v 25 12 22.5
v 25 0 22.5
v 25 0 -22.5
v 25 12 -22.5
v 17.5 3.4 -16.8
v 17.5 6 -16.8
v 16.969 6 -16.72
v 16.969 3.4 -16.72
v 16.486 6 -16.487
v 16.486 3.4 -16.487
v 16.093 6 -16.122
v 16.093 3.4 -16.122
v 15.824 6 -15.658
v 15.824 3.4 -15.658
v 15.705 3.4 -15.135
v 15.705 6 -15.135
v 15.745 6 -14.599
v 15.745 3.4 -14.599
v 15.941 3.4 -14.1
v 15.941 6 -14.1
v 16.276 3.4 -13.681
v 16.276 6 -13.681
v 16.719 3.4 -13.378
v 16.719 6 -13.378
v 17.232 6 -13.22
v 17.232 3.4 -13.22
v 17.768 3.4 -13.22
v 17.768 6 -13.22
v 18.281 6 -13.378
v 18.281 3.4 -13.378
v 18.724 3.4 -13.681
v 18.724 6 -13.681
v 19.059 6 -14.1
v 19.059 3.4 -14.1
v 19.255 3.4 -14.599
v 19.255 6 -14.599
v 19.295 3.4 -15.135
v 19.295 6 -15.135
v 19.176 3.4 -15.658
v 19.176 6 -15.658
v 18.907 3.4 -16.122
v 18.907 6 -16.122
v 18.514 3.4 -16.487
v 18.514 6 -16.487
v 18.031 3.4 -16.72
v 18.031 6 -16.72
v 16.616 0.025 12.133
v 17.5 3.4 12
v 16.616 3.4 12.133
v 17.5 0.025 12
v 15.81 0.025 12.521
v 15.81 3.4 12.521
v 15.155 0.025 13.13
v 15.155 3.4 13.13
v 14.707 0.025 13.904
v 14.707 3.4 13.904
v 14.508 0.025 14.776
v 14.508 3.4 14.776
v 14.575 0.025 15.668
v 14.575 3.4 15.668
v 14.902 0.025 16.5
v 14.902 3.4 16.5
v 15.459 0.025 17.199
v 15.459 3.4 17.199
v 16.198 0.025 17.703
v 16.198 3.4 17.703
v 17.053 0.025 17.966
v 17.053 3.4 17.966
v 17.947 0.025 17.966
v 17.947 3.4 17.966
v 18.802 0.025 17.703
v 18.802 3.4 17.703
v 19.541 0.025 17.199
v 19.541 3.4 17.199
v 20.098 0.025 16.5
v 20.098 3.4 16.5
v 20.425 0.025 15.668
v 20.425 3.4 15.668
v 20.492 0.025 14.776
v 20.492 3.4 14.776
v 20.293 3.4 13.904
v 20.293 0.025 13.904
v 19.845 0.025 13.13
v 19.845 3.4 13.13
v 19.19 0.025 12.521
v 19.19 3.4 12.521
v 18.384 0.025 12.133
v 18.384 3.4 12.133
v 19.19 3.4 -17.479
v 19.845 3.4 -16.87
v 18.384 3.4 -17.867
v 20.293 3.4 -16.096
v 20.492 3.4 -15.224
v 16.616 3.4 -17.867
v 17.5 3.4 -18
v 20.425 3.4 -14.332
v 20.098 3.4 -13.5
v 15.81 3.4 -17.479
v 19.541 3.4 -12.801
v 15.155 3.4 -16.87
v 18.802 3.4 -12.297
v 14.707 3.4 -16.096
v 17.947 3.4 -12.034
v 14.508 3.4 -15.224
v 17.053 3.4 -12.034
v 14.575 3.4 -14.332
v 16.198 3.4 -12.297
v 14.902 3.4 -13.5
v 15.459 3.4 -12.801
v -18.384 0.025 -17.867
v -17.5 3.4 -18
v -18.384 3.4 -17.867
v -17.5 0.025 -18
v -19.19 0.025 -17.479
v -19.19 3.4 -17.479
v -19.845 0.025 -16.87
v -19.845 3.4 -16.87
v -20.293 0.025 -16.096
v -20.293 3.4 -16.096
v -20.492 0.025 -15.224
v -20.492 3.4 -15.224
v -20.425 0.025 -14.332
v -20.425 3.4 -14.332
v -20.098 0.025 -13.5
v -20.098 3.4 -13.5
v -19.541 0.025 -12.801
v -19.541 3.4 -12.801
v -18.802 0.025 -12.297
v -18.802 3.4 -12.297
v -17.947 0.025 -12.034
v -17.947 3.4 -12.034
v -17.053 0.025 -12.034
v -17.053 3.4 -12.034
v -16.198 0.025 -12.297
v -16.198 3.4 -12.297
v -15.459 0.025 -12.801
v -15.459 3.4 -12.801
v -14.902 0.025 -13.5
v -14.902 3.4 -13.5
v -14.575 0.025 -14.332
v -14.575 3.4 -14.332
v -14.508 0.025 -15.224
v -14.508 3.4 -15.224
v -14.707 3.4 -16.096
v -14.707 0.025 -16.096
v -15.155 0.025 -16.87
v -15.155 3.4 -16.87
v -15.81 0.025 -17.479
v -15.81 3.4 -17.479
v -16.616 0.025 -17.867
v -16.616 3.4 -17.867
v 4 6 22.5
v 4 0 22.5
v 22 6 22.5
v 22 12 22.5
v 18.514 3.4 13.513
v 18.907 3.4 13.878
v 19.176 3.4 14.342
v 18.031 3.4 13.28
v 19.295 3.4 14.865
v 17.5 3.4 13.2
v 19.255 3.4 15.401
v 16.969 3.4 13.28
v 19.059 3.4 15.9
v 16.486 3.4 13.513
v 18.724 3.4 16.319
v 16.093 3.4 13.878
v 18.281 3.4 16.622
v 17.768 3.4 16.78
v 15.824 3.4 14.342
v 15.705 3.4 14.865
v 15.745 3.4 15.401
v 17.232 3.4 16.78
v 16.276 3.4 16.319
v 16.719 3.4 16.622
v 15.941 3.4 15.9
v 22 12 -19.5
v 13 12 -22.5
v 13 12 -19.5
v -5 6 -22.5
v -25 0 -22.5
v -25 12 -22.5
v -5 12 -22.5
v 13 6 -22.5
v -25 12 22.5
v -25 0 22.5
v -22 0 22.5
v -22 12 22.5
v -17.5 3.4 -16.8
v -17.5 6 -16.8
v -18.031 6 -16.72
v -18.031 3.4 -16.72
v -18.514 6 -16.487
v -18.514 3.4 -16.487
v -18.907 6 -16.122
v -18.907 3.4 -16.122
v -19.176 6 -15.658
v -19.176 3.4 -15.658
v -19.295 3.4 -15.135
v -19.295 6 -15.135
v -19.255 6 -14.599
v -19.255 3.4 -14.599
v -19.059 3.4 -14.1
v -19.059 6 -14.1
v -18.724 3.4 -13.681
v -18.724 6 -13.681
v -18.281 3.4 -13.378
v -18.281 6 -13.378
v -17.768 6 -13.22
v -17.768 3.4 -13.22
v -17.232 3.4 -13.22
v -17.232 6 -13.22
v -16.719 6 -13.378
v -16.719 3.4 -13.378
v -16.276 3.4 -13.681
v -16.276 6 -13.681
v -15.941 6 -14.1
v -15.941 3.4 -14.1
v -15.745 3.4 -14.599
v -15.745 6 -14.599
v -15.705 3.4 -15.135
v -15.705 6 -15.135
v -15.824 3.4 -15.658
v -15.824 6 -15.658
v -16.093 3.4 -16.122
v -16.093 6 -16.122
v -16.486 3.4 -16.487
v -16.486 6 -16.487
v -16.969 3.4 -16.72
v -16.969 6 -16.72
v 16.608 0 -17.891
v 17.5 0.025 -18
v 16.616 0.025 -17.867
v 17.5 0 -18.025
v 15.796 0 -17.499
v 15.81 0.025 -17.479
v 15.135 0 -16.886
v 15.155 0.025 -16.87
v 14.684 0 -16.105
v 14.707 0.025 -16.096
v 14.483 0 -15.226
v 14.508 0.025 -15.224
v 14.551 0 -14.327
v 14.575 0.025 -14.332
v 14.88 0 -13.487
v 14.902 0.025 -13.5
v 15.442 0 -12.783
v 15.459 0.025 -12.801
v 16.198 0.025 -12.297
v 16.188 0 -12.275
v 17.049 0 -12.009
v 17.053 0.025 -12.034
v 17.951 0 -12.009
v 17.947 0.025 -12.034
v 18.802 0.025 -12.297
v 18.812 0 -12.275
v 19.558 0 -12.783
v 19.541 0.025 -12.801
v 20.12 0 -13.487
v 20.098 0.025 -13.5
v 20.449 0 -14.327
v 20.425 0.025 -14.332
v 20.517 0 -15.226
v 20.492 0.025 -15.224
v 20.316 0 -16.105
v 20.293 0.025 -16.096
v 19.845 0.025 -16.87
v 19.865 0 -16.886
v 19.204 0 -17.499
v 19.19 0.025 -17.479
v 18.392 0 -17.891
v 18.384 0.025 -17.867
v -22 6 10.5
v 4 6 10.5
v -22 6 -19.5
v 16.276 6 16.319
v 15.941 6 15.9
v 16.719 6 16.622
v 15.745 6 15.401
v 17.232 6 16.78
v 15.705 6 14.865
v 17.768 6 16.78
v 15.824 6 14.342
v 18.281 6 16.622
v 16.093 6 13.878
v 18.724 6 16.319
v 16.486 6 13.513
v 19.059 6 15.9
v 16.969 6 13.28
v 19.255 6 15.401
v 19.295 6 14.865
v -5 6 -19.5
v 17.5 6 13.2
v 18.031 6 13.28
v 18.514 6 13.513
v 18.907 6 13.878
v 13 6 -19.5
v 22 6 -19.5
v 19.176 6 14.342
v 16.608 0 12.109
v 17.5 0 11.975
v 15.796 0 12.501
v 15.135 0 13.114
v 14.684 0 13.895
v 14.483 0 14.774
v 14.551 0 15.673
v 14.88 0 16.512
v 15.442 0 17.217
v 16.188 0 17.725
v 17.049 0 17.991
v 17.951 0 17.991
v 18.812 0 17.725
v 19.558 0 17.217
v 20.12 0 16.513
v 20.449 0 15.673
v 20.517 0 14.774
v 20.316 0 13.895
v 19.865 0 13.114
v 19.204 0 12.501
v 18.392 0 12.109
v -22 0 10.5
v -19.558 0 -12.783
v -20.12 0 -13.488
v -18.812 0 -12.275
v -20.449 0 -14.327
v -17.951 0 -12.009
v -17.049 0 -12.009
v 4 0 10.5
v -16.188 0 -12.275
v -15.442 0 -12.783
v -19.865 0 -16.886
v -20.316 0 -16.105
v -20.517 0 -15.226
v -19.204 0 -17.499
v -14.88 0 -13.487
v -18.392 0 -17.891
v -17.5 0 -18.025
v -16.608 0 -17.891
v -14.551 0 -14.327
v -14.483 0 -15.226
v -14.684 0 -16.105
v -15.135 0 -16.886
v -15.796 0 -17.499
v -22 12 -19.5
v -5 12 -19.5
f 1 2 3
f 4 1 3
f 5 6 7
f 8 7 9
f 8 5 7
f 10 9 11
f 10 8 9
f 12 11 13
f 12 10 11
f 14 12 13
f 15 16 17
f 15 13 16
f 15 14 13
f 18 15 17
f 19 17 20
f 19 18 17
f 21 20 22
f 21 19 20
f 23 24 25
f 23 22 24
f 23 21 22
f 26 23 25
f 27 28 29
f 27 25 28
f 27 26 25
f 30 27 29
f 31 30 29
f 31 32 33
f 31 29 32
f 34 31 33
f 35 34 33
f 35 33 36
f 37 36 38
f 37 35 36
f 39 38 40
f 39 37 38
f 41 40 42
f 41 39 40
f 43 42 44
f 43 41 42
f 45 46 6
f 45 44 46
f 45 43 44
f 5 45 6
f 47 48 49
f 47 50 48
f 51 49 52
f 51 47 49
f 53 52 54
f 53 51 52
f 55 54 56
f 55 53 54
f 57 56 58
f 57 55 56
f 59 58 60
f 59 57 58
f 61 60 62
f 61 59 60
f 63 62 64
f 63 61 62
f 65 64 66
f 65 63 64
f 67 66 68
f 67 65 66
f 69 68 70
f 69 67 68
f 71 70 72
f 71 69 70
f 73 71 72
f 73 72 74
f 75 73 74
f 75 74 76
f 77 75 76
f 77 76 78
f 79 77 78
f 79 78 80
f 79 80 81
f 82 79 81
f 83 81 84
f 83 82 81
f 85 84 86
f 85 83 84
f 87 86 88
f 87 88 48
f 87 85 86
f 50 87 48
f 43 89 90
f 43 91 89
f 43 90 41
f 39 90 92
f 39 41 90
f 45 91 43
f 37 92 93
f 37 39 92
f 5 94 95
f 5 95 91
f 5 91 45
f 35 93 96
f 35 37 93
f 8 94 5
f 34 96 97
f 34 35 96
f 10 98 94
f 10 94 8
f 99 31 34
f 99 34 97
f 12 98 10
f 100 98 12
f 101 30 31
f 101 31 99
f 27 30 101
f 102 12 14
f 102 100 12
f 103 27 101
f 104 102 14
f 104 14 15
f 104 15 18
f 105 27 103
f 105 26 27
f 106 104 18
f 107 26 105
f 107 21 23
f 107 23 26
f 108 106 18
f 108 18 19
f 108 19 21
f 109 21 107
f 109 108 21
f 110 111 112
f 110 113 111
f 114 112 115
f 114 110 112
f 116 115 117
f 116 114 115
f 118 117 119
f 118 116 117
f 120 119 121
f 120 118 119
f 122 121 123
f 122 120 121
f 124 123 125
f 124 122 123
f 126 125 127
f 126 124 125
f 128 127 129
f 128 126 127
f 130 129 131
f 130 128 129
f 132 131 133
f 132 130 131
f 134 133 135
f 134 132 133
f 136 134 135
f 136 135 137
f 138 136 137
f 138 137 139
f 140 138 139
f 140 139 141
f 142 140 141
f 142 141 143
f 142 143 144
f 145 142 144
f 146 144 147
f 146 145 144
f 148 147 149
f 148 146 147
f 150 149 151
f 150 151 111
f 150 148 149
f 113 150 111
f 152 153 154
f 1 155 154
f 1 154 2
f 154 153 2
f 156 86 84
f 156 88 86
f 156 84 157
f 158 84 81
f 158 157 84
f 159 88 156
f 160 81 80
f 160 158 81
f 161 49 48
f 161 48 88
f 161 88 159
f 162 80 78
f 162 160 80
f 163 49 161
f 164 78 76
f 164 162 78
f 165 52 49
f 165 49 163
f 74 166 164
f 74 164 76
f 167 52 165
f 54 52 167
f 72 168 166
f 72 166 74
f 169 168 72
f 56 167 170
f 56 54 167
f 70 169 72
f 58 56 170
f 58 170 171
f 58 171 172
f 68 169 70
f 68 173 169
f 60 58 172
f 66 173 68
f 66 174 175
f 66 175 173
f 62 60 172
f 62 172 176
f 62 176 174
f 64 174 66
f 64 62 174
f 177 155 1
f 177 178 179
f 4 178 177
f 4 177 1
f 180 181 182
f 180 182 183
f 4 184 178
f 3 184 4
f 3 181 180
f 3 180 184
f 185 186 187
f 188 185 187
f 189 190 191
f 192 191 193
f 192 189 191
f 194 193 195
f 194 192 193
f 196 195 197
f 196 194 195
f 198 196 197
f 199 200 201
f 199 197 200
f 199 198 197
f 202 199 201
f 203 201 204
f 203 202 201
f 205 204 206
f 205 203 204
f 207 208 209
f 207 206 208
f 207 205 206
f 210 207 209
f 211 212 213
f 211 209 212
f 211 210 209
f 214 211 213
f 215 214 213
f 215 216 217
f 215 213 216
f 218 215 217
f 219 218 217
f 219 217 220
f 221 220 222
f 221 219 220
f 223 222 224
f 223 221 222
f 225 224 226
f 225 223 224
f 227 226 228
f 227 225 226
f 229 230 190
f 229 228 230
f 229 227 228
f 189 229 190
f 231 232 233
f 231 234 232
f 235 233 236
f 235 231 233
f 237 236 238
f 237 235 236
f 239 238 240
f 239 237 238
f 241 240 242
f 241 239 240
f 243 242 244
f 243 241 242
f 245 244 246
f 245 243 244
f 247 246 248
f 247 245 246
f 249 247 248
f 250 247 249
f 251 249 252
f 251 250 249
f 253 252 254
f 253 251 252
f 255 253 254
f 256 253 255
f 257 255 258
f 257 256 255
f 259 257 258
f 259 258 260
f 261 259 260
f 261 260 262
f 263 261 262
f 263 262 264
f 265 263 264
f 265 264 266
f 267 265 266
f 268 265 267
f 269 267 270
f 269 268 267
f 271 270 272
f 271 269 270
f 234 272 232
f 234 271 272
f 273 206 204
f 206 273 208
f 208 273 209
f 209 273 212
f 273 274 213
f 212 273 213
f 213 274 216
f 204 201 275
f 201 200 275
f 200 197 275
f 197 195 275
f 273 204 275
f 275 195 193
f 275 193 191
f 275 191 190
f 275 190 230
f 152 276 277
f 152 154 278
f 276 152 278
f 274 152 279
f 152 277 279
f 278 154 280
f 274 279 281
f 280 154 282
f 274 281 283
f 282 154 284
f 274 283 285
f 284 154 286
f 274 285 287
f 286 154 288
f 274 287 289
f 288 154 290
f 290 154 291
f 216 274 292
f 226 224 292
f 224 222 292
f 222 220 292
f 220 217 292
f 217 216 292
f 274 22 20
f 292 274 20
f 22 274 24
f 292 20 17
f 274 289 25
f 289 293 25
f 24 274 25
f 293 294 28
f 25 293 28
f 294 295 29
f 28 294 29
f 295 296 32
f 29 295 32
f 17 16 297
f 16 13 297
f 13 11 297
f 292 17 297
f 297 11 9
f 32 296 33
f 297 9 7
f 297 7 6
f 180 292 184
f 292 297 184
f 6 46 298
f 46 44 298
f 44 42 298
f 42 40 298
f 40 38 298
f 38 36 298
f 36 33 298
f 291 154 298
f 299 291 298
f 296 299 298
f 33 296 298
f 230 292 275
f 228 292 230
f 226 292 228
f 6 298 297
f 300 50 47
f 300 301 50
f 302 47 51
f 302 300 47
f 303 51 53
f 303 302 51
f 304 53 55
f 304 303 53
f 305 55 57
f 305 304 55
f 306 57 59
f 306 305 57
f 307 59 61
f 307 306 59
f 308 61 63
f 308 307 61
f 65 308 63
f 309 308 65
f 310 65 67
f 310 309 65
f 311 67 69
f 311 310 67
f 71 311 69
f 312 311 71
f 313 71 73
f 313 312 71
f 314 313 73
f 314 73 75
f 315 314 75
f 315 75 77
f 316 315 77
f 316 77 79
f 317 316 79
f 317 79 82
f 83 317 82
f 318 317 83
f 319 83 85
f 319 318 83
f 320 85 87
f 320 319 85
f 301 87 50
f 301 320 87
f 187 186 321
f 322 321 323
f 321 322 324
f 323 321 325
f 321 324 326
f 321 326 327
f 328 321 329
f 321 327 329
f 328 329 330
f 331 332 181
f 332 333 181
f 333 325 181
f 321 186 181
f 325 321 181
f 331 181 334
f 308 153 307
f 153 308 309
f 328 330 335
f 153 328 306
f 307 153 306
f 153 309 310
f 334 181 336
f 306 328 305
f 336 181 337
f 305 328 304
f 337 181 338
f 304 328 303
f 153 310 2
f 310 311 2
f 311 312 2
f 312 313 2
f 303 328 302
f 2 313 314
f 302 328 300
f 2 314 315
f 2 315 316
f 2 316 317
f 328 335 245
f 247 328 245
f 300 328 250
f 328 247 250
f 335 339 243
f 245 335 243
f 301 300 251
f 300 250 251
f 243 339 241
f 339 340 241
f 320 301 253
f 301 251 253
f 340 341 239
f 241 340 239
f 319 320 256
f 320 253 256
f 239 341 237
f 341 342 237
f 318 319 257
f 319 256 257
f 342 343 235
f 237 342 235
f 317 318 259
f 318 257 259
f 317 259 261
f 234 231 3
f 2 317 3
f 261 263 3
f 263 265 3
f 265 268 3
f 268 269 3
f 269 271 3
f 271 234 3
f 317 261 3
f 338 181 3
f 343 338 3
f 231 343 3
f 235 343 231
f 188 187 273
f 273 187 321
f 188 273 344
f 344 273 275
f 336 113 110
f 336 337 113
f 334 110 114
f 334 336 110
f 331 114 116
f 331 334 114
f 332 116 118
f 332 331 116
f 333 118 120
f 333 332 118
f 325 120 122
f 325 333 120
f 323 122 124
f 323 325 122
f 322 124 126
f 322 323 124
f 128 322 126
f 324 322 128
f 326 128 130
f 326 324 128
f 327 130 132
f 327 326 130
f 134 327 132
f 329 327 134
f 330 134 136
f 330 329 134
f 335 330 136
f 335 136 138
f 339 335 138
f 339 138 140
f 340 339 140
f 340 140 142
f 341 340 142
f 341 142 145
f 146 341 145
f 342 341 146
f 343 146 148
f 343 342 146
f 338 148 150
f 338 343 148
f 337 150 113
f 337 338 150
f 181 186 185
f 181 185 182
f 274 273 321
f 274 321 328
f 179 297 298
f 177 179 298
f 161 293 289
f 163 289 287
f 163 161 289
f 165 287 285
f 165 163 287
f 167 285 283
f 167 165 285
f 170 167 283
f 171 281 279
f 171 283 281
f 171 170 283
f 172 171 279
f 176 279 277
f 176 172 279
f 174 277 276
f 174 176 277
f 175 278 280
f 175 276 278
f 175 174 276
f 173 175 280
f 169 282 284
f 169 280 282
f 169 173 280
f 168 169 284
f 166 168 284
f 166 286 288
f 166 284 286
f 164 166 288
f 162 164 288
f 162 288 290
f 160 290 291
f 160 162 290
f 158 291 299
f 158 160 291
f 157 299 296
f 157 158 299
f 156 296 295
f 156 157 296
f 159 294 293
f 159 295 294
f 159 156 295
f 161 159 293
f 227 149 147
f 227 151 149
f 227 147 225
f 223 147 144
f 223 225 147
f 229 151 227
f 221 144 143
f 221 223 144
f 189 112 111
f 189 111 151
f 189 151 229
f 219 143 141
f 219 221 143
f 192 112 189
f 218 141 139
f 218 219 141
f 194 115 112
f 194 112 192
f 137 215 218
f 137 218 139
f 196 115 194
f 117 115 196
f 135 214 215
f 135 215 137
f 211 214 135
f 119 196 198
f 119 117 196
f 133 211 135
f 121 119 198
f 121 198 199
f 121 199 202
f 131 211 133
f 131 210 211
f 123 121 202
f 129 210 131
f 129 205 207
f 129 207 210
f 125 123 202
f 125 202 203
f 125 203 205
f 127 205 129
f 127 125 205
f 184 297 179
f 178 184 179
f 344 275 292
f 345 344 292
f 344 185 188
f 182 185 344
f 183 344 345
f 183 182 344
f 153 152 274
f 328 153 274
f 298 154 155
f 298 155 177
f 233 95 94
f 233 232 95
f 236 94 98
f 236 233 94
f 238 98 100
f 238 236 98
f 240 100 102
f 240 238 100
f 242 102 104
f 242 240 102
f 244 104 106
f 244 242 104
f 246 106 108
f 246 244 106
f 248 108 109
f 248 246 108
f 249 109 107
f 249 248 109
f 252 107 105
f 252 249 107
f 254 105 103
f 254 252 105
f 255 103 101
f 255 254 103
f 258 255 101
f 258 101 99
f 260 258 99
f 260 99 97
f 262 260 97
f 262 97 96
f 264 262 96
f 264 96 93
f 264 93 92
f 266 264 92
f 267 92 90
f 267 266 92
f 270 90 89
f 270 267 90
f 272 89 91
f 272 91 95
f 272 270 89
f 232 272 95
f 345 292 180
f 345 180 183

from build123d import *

# Parameters (mm, degrees)
SKETCH_1_W                 = 50
SKETCH_1_H                 = 45
EXTRUDE_1_DEPTH            = 12
SHELL_1_T                  = -3
SHELL_1_THICKNESS_2_FACE_W = 39
SHELL_1_THICKNESS_2_FACE_H = 44
SHELL_1_THICKNESS_2_DEPTH  = 3
HOLE_WIZARD_1_AT_2_COUNT   = 2
HOLE_WIZARD_1_AT_2_PITCH   = 35
HOLE_WIZARD_1_AT_3_COUNT   = 2
HOLE_WIZARD_1_AT_3_PITCH   = 46.097722286
HOLE_WIZARD_1_AT_4_COUNT   = 2
HOLE_WIZARD_1_AT_4_PITCH   = 30
CUT_EXTRUDE_START          = -40
SKETCH_4_W                 = 18
SKETCH_4_H                 = 6
CUT_EXTRUDE_1_DEPTH        = 12
SKETCH_5_W                 = 44
SKETCH_5_H                 = 6
CUT_EXTRUDE_2_DEPTH        = 12
SKETCH_6_W                 = 26
SKETCH_6_H                 = 12
CUT_EXTRUDE_3_DEPTH        = 12


with BuildPart() as part:
    # 草图1 → 凸台-拉伸1 (new body)
    with BuildSketch(Plane(origin=(0, 0, 0), x_dir=(1, 0, 0), z_dir=(0, 1, 0))):
        Rectangle(SKETCH_1_W, SKETCH_1_H)
    extrude(amount=EXTRUDE_1_DEPTH)

    # 抽壳1
    shell_1_openings = [part.faces().sort_by_distance(p)[0] for p in [
        (0, 12, 0),
    ]]
    offset(amount=SHELL_1_T, openings=shell_1_openings, kind=Kind.INTERSECTION)

    # 抽壳1 thickness 2 face (on inner face of the shell) → 抽壳1 thickness 2 (add)
    with BuildSketch(Plane(origin=(0, 3, 0), x_dir=(0, 0, -1), z_dir=(0, -1, 0))):
        Rectangle(SHELL_1_THICKNESS_2_FACE_W, SHELL_1_THICKNESS_2_FACE_H)
    extrude(amount=-SHELL_1_THICKNESS_2_DEPTH)

    # 草图3 → 打孔尺寸(%根据)内六角圆柱头螺钉的类型1 (revolve, cut)
    with BuildSketch(Plane(origin=(-17.5, 0, 15), x_dir=(0, 0, -1), z_dir=(1, 0, 0))):
        Polygon((0, 0), (0, 12), (1.8, 12), (1.8, 3.4), (3, 3.4), (3, 0.025), (3.025, 0), align=None)
    hole_wizard_1 = revolve(axis=Axis((-17.5, -6.35, 15), (0, 1, 0)), mode=Mode.SUBTRACT)

    # 打孔尺寸(%根据)内六角圆柱头螺钉的类型1 at 2: 打孔尺寸(%根据)内六角圆柱头螺钉的类型1 ×2
    with Locations(*[(i * HOLE_WIZARD_1_AT_2_PITCH, 0, 0) for i in range(1, HOLE_WIZARD_1_AT_2_COUNT)]):
        add(hole_wizard_1, mode=Mode.SUBTRACT)

    # 打孔尺寸(%根据)内六角圆柱头螺钉的类型1 at 3: 打孔尺寸(%根据)内六角圆柱头螺钉的类型1 ×2
    with Locations(*[Vector(0.7592566023652966, 0, -0.6507913734559685) * (i * HOLE_WIZARD_1_AT_3_PITCH) for i in range(1, HOLE_WIZARD_1_AT_3_COUNT)]):
        add(hole_wizard_1, mode=Mode.SUBTRACT)

    # 打孔尺寸(%根据)内六角圆柱头螺钉的类型1 at 4: 打孔尺寸(%根据)内六角圆柱头螺钉的类型1 ×2
    with Locations(*[(0, 0, -i * HOLE_WIZARD_1_AT_4_PITCH) for i in range(1, HOLE_WIZARD_1_AT_4_COUNT)]):
        add(hole_wizard_1, mode=Mode.SUBTRACT)

    # 草图4 → 切除-拉伸1 (cut)
    with BuildSketch(Plane.XY.offset(22.5).offset(CUT_EXTRUDE_START)):
        with Locations((4, 9)):
            Rectangle(SKETCH_4_W, SKETCH_4_H)
    extrude(amount=-CUT_EXTRUDE_1_DEPTH, mode=Mode.SUBTRACT)

    # 草图5 → 切除-拉伸2 (cut)
    with BuildSketch(Plane.XY.offset(22.5)):
        with Locations((0, 9)):
            Rectangle(SKETCH_5_W, SKETCH_5_H)
    extrude(amount=-CUT_EXTRUDE_2_DEPTH, mode=Mode.SUBTRACT)

    # 草图6 → 切除-拉伸3 (cut)
    with BuildSketch(Plane(origin=(0, 6, 0), x_dir=(1, 0, 0), z_dir=(0, 1, 0))):
        with Locations((-9, -16.5)):
            Rectangle(SKETCH_6_W, SKETCH_6_H)
    extrude(amount=-CUT_EXTRUDE_3_DEPTH, mode=Mode.SUBTRACT)


solid = part.part
